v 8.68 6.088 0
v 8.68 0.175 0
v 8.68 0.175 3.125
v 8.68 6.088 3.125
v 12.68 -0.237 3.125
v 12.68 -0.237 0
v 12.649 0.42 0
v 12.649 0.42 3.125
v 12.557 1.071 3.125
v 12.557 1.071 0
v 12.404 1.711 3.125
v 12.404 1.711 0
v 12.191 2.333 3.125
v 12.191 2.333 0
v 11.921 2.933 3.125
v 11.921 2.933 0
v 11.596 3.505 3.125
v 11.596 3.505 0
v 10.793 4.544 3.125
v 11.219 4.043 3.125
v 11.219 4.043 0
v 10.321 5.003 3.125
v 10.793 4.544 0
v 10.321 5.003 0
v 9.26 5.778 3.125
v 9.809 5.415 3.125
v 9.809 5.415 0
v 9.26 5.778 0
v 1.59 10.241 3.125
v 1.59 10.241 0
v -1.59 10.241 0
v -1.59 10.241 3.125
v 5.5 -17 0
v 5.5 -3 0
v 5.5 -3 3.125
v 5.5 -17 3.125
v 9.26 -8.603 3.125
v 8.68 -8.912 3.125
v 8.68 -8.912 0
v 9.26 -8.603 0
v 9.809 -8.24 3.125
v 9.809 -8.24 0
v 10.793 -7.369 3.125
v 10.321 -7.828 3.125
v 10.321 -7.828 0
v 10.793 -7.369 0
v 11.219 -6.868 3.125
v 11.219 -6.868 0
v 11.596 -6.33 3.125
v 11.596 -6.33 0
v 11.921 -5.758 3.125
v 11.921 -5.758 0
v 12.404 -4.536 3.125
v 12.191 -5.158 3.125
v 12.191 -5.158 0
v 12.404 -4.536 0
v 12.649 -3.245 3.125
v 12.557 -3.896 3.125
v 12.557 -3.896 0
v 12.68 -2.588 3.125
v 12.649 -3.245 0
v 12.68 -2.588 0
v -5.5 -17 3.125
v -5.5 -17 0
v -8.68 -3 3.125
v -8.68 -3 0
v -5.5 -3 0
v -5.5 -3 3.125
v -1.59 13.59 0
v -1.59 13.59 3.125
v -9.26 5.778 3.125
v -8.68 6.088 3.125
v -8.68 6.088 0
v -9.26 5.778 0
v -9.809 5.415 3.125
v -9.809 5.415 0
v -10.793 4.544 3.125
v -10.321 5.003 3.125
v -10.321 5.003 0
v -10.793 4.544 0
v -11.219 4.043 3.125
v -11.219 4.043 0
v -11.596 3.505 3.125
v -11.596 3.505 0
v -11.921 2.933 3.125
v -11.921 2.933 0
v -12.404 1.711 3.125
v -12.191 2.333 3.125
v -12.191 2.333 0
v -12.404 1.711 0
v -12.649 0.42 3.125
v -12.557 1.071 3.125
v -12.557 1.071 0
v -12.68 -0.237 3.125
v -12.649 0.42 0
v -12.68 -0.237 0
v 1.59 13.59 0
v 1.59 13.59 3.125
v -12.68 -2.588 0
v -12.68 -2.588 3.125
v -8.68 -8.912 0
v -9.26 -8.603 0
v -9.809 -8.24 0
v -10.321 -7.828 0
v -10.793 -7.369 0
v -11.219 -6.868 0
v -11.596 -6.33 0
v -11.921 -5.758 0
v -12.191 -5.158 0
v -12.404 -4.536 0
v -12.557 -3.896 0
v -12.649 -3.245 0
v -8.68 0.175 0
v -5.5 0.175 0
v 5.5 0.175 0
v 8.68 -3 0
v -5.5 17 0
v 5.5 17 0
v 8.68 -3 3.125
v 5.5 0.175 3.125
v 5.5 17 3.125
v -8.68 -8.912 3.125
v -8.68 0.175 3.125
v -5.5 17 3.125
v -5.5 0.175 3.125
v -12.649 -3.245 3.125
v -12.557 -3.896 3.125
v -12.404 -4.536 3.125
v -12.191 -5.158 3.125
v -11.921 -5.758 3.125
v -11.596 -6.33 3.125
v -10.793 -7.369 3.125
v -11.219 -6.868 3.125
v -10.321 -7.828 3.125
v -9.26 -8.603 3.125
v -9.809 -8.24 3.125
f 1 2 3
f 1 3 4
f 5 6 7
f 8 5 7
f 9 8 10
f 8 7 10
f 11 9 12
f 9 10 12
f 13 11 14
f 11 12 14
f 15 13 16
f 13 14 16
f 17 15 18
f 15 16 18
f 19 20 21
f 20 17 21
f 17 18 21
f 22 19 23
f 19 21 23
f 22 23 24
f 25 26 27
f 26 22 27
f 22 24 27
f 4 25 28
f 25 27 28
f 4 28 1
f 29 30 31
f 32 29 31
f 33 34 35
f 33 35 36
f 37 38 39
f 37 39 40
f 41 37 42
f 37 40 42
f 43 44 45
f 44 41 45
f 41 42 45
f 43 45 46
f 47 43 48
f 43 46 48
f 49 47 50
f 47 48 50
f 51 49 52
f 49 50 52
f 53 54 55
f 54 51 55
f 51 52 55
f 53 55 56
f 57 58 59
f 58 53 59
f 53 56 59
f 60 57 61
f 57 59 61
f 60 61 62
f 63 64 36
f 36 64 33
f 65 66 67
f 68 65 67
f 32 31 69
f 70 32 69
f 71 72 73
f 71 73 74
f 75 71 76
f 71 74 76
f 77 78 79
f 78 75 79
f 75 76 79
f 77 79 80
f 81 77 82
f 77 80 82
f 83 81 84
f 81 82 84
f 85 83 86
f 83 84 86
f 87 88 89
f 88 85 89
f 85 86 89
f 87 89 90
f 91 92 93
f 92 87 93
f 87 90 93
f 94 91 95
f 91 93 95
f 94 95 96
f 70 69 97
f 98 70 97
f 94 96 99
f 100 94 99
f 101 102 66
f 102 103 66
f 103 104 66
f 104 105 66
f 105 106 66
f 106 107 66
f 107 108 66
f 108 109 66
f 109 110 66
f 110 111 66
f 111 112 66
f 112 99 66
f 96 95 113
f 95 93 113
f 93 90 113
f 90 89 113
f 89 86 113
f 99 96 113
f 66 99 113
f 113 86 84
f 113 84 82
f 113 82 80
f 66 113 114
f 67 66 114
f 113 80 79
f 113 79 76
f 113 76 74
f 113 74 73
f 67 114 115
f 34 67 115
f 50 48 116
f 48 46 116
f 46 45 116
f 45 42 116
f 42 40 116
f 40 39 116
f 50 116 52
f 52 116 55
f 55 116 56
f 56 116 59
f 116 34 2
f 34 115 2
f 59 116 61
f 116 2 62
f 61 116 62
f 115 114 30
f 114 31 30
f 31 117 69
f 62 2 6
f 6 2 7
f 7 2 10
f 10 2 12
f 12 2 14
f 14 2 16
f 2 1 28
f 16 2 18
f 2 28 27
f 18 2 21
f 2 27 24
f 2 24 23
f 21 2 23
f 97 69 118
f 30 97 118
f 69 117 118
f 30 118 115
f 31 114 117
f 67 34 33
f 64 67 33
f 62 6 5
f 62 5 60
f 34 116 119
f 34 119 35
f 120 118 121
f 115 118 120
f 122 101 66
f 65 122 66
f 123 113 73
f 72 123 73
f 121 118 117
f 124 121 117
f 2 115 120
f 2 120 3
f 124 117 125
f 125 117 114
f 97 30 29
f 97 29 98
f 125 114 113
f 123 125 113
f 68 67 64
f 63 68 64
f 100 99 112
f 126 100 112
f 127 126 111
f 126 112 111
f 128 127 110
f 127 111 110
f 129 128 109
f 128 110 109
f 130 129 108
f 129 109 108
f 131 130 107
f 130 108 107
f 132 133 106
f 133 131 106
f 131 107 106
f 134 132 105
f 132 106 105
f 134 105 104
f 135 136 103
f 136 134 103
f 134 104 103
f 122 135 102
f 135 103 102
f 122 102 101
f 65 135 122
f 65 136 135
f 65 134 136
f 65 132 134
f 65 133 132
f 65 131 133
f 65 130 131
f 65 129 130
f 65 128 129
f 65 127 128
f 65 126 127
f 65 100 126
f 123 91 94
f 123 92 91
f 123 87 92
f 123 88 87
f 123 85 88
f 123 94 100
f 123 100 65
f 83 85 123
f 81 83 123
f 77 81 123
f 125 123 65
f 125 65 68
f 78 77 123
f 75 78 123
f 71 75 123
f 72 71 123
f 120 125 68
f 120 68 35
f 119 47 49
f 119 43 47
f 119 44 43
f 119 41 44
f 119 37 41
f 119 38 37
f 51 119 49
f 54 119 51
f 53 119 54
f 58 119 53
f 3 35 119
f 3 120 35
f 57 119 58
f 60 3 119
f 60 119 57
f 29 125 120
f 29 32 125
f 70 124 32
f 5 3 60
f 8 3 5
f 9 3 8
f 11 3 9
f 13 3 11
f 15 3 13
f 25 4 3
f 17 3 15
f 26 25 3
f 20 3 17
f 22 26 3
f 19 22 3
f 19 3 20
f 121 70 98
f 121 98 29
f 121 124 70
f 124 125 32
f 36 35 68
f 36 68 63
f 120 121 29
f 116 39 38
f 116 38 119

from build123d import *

# Parameters (mm, degrees)
BOSS_EXTRUDE1_DEPTH = 3.125
FILLET1_R           = 7


with BuildPart() as part:
    # Sketch2 → Boss-Extrude1 (new body)
    with BuildSketch(Plane.XY):
        Polygon((0, 17), (5.5, 17), (5.5, 0.175), (8.68, 0.175), (8.68, 6.0875), (12.68, 6.0875), (12.68, -8.9125), (8.68, -8.9125), (8.68, -3), (5.5, -3), (5.5, -17), (0, -17), (0, 10.241210398), (1.59, 10.241210398), (1.59, 13.59), (0, 13.59), align=None)
    boss_extrude1 = extrude(amount=BOSS_EXTRUDE1_DEPTH)

    # Mirror1: Boss-Extrude1 across plane
    add(boss_extrude1.mirror(Plane(origin=(0, 10.241210398, 3.125), x_dir=(0, 0, 1), z_dir=(1, 0, 0))))

    # Fillet1
    # the kernel refuses this fillet: 7 mm, written as the material it takes off along each edge
    with BuildSketch(Plane(origin=(-12.68, -8.9125, -15.811388301), x_dir=(0, 1, 0), z_dir=(0, 0, 1)), Plane(origin=(12.68, 6.0875, -15.811388301), x_dir=(0, -1, 0), z_dir=(0, 0, 1))) as fillet1_piece_1:
        with BuildLine():
            CenterArc((6.32455532, -7), FILLET1_R, 90, 64.623066475)
            Line((0, -4), (-0.126491106, -3.94))
            ThreePointArc((-0.126491106, -3.94), (-0.14, -2), (-0.14, 0))
            Line((-0.14, 0), (0, 0.14))
            Line((0, 0.14), (6.32455532, 0.14))
            Line((6.32455532, 0.14), (6.32455532, 0))
        make_face()
    extrude(amount=34.747776602, mode=Mode.SUBTRACT)
    with BuildSketch(Plane(origin=(-12.68, 6.0875, -15.811388301), x_dir=(1, 0, 0), z_dir=(0, 0, 1)), Plane(origin=(12.68, -8.9125, -15.811388301), x_dir=(-1, 0, 0), z_dir=(0, 0, 1))) as fillet1_piece_2:
        with BuildLine():
            CenterArc((7, -6.32455532), FILLET1_R, 115.376933525, 64.623066475)
            Line((0, -6.32455532), (-0.14, -6.32455532))
            Line((-0.14, -6.32455532), (-0.14, 0))
            Line((-0.14, 0), (0, 0.14))
            ThreePointArc((0, 0.14), (2, 0.14), (3.94, 0.126491106))
            Line((3.94, 0.126491106), (4, 0))
        make_face()
    extrude(amount=34.747776602, mode=Mode.SUBTRACT)


solid = part.part
